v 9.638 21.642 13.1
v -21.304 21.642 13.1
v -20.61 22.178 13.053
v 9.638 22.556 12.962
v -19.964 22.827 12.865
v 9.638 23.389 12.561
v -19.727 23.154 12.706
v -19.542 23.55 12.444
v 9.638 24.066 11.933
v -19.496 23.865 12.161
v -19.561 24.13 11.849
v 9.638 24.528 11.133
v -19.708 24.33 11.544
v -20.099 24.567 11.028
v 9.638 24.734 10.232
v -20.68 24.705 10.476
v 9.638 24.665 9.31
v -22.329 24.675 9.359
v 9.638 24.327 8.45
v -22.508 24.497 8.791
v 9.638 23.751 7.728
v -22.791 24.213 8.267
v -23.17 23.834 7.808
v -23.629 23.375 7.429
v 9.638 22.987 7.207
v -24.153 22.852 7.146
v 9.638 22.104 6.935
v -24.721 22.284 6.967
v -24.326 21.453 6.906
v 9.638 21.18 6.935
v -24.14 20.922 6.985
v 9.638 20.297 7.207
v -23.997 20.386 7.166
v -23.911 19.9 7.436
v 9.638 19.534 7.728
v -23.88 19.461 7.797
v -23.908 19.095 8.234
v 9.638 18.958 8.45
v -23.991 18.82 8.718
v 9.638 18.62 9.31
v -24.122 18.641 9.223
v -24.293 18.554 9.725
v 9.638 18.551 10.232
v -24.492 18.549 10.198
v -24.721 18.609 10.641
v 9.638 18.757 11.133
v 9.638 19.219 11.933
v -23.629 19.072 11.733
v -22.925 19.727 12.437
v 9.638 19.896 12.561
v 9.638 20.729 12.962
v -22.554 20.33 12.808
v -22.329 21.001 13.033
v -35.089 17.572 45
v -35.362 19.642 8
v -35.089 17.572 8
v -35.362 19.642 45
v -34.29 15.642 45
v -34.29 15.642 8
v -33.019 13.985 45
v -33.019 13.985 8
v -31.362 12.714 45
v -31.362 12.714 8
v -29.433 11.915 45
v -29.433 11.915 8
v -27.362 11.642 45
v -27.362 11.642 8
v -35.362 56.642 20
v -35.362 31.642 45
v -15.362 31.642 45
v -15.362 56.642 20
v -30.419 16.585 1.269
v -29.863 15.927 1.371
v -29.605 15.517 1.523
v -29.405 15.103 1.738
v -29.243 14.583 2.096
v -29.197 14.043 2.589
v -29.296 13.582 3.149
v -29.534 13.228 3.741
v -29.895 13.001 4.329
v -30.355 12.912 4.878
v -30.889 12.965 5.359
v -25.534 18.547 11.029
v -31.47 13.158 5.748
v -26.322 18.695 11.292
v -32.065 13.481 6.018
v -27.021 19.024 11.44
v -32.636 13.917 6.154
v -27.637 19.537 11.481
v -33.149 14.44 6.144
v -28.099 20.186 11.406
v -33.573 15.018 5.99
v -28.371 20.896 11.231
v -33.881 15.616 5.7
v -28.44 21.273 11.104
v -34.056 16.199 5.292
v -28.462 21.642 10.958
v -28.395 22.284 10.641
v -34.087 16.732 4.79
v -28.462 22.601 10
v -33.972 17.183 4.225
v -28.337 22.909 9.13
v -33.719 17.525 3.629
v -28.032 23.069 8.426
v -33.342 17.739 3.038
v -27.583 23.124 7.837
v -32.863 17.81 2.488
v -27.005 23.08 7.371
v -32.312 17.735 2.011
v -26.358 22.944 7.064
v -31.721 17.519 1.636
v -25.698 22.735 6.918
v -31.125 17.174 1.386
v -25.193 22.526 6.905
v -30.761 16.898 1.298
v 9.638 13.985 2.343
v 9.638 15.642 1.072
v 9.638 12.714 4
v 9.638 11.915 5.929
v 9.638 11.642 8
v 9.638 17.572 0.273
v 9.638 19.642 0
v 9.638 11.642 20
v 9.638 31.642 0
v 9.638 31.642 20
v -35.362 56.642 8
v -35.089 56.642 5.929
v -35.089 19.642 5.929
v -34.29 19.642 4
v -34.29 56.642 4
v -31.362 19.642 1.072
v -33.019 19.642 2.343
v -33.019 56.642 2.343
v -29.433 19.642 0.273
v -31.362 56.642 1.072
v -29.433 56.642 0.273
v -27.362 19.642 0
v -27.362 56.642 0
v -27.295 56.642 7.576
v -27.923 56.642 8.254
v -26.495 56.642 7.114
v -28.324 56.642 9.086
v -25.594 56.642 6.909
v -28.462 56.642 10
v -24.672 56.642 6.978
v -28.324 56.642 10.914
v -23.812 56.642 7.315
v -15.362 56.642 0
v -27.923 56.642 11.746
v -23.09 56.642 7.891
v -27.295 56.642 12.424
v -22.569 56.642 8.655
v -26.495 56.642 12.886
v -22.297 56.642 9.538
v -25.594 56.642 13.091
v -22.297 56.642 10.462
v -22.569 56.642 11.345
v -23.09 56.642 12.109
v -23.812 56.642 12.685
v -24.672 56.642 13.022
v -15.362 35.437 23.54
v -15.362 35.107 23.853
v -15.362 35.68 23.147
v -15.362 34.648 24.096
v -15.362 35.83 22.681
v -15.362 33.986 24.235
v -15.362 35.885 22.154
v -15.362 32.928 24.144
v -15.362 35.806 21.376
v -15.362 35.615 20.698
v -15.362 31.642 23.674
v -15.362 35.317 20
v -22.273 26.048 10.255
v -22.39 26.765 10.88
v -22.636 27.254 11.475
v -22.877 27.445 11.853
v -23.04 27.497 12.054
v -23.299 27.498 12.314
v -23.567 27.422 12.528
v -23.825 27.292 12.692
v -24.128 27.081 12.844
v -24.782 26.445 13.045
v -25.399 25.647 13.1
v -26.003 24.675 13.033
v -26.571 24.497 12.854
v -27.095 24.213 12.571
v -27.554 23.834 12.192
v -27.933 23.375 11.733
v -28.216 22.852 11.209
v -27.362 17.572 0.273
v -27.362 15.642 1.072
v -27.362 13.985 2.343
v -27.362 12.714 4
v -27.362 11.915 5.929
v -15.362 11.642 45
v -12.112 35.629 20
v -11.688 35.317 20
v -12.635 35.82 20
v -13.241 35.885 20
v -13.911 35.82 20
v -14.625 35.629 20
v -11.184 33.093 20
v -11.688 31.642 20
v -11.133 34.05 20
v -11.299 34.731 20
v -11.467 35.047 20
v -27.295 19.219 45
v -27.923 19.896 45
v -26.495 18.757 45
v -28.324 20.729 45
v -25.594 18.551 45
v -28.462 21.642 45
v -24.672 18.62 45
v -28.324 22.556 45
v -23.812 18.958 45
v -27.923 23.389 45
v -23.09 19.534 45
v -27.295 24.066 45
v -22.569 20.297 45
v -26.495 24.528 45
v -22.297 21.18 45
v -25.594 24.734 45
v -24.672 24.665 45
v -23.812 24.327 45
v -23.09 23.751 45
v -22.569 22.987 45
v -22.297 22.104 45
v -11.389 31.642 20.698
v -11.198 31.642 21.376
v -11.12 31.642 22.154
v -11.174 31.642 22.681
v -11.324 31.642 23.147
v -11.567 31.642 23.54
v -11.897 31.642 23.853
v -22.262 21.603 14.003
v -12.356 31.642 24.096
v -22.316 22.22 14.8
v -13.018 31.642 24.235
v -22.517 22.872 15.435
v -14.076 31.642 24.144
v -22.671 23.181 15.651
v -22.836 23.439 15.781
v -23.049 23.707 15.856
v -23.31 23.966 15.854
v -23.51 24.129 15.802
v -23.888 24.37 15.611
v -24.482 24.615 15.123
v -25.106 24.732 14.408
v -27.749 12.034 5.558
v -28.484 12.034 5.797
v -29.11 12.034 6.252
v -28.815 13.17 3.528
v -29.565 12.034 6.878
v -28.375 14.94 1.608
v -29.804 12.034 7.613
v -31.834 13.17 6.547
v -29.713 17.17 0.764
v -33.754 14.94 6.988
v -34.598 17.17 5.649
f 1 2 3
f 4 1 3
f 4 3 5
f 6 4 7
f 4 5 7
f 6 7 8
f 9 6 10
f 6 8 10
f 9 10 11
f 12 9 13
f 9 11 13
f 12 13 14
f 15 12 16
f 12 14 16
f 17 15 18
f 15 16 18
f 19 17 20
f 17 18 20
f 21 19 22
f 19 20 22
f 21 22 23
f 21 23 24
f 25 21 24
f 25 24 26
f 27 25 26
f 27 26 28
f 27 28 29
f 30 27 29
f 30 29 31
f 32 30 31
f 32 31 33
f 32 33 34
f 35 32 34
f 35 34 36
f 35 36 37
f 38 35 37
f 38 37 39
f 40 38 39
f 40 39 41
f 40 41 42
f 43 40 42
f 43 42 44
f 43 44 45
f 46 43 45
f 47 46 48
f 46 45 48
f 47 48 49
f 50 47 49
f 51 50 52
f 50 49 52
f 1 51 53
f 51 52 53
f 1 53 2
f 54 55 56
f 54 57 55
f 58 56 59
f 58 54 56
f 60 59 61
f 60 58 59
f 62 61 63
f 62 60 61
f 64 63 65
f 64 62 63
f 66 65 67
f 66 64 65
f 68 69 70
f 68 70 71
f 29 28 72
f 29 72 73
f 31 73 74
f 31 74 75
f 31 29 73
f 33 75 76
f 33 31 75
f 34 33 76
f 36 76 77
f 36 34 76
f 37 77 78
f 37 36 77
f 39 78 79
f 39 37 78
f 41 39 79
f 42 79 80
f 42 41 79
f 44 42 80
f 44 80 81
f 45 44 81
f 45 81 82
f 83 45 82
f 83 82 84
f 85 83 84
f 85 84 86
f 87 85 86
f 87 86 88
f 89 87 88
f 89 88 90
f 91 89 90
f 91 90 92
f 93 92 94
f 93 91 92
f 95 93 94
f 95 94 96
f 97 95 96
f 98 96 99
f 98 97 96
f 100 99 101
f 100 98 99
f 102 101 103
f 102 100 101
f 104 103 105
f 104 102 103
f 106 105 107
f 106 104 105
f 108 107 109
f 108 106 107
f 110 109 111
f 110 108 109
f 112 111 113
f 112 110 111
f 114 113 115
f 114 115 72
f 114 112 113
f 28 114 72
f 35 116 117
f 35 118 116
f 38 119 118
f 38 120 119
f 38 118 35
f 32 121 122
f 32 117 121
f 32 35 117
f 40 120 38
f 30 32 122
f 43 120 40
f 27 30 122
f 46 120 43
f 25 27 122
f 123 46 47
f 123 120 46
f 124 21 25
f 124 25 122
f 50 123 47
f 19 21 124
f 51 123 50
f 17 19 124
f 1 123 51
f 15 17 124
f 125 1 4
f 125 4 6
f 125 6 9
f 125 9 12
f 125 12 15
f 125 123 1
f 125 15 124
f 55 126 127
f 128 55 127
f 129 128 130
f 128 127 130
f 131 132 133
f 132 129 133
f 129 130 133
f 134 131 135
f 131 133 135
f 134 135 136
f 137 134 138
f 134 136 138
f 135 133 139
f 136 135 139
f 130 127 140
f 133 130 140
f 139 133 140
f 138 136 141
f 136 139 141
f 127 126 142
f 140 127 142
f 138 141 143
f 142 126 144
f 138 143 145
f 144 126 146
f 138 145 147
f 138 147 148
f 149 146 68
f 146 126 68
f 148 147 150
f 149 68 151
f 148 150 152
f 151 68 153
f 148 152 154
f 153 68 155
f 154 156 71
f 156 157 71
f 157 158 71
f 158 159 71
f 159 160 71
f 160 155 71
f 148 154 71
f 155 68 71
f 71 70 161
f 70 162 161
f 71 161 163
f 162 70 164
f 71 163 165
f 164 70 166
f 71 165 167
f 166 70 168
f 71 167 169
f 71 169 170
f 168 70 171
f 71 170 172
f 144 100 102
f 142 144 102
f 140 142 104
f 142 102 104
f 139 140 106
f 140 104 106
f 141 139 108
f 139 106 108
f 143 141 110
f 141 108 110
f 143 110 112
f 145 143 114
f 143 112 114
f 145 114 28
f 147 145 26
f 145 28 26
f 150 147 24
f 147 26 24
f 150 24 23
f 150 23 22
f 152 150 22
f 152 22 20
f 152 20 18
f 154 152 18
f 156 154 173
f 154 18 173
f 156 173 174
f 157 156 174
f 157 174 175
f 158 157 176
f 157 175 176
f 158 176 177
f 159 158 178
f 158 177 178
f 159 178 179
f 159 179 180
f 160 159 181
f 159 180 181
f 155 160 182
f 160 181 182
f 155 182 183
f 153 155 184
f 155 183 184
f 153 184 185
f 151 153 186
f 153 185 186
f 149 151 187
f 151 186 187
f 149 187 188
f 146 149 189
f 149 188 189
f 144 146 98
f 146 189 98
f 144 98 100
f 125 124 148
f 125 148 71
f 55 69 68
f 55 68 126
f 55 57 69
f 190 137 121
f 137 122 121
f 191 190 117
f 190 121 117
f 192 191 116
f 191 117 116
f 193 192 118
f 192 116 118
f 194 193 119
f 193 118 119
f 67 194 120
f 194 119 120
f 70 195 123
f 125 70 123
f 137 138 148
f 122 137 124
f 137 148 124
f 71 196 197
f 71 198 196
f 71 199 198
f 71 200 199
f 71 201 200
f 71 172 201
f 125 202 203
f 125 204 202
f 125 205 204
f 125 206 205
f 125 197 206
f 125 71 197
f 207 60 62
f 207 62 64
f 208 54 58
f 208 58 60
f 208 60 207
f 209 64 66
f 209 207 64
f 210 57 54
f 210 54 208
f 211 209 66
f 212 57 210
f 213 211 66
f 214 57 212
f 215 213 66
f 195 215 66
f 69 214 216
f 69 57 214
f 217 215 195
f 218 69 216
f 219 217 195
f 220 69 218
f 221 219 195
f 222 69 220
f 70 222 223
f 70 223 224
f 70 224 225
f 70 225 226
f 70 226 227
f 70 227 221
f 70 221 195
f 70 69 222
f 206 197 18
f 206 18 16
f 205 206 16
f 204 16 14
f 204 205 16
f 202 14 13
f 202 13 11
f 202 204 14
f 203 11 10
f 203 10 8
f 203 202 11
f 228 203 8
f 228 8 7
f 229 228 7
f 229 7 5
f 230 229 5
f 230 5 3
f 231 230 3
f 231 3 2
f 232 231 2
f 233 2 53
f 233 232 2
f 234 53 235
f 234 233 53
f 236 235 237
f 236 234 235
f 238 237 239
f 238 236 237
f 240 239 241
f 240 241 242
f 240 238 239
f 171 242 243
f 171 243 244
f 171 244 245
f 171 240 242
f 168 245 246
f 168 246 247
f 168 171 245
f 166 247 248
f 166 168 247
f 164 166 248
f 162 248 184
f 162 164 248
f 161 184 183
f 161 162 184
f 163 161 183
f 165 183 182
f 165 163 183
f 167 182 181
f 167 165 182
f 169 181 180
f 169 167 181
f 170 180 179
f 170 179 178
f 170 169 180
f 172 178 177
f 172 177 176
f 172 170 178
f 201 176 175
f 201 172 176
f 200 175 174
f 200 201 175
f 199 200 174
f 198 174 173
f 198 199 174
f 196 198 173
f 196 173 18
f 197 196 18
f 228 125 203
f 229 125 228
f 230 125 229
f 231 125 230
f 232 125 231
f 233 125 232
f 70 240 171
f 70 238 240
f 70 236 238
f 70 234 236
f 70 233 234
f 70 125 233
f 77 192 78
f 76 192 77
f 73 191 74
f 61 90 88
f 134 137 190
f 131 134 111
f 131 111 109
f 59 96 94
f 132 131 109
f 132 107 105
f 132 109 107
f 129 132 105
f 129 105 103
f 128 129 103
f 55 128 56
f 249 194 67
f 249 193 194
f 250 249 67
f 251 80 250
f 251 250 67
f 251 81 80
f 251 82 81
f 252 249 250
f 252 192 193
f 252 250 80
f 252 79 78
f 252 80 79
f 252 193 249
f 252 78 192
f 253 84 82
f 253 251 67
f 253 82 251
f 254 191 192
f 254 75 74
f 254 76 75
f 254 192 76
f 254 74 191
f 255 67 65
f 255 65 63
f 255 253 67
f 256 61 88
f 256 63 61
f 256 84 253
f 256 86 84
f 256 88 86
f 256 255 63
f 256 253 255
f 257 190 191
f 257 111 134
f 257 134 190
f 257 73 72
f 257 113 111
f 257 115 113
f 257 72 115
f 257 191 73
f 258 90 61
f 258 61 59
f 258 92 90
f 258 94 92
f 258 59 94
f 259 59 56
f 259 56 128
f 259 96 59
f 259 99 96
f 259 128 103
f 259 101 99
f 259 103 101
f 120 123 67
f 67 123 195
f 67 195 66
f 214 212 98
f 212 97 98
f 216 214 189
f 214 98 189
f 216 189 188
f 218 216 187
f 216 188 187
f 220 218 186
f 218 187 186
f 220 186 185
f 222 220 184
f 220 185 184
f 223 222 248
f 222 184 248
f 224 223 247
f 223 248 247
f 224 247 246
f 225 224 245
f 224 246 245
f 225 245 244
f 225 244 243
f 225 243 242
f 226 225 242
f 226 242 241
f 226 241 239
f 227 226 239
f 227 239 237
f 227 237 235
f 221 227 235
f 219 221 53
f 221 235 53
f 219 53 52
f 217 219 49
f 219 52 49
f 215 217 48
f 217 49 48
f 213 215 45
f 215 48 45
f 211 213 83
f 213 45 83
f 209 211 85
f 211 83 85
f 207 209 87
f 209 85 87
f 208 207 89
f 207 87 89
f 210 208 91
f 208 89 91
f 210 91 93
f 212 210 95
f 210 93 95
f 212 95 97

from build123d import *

# Parameters (mm, degrees)
ESBO_O1_W                        = 45
ESBO_O1_H                        = 45
RESSALTO_EXTRUS_O1_DEPTH         = 20
ESBO_O2_W                        = 25
ESBO_O2_H                        = 25
CORTE_EXTRUS_O1_DEPTH            = 70.705238631
ESBO_O3_W                        = 20
ESBO_O3_H                        = 20
RESSALTO_EXTRUS_O2_DEPTH         = 25
FURO_DE_DI_METRO_6_2_6_2_1_D     = 6.2
FURO_DE_DI_METRO_6_2_6_2_1_DEPTH = 35
FURO_DE_DI_METRO_6_2_6_2_2_D     = 6.2
FURO_DE_DI_METRO_6_2_6_2_2_DEPTH = 35
FURO_DE_DI_METRO_6_2_6_2_3_D     = 6.2
FURO_DE_DI_METRO_6_2_6_2_3_DEPTH = 35
FILETE2_R                        = 8
CHANFRO1_SIZE                    = 25
CHANFRO2_SIZE                    = 25
RESSALTO_EXTRUS_O3_DEPTH         = 20
ESBO_O12_R                       = 3
CORTE_EXTRUS_O2_DEPTH            = 71.906960985


# Some blends are built 0.0001 mm under size
with BuildPart() as part:
    # Esboço1 → Ressalto-extrusão1 (new body)
    with BuildSketch(Plane.XY.offset(20)):
        with Locations((-12.862035225, 34.142270059)):
            Rectangle(ESBO_O1_W, ESBO_O1_H)
    extrude(amount=-RESSALTO_EXTRUS_O1_DEPTH)

    # Esboço2 → Corte-extrusão1 (cut, through all)
    with BuildSketch(Plane(origin=(0, 0, 0), x_dir=(-1, 0, 0), z_dir=(0, 0, -1))):
        with Locations((2.862035225, 44.142270059)):
            Rectangle(ESBO_O2_W, ESBO_O2_H)
    extrude(amount=-CORTE_EXTRUS_O1_DEPTH, mode=Mode.SUBTRACT)

    # Esboço3 → Ressalto-extrusão2 (add)
    with BuildSketch(Plane.XY.offset(20)):
        with Locations((-25.362035225, 21.642270059)):
            Rectangle(ESBO_O3_W, ESBO_O3_H)
    extrude(amount=RESSALTO_EXTRUS_O2_DEPTH)

    # Furo de diâmetro Ø6.2 (6.2)1
    with Locations(Plane(origin=(9.637964775, 0, 0), x_dir=(0, 0, -1), z_dir=(1, 0, 0))):
        with Locations((-10, 21.642270059)):
            Hole(FURO_DE_DI_METRO_6_2_6_2_1_D / 2, depth=FURO_DE_DI_METRO_6_2_6_2_1_DEPTH)

    # Furo de diâmetro Ø6.2 (6.2)2
    with Locations(Plane(origin=(0, 56.642270059, 0), x_dir=(1, 0, 0), z_dir=(0, 1, 0))):
        with Locations((-25.362035225, -10)):
            Hole(FURO_DE_DI_METRO_6_2_6_2_2_D / 2, depth=FURO_DE_DI_METRO_6_2_6_2_2_DEPTH)

    # Furo de diâmetro Ø6.2 (6.2)3
    with Locations(Plane.XY.offset(45)):
        with Locations((-25.362035225, 21.642270059)):
            Hole(FURO_DE_DI_METRO_6_2_6_2_3_D / 2, depth=FURO_DE_DI_METRO_6_2_6_2_3_DEPTH)

    # Filete2
    filete2_edges = [part.edges().sort_by_distance(p)[0] for p in [
        (-35.362035225, 34.142270059, 0),
        (-12.862035225, 11.642270059, 0),
        (-35.362035225, 11.642270059, 22.5),
    ]]
    fillet(filete2_edges, radius=FILETE2_R)

    # Chanfro1
    # the kernel refuses this chamfer: 25 mm, written as the material it adds along each edge
    with BuildSketch(Plane(origin=(-35.362035225, 31.642270059, 20), x_dir=(0, -0.027495876610586317, 0.9996219169112966), z_dir=(1, 0, 0))) as chanfro1_piece_1_section:
        Polygon((CHANFRO1_SIZE * 0.999621916911, -CHANFRO1_SIZE * 0.0274958766106), (-CHANFRO1_SIZE * 0.0274958766106, -CHANFRO1_SIZE * 0.999621916911), (0, 0), align=None)
    chanfro1_piece_1 = extrude(amount=20, mode=Mode.PRIVATE)
    chanfro1_piece_1 = split(chanfro1_piece_1, bisect_by=Plane(origin=(-25.362035225, 39.873368248, 45), z_dir=(0, 0, -1)), keep=Keep.TOP, mode=Mode.PRIVATE)
    chanfro1_piece_1 = split(chanfro1_piece_1, bisect_by=Plane(origin=(-25.362035225, 56.642270059, 28.231098189), z_dir=(0, -1, 0)), keep=Keep.TOP, mode=Mode.PRIVATE)
    add(chanfro1_piece_1)

    # Chanfro2
    chanfro2_edges = [part.edges().sort_by_distance(p)[0] for p in [
        (-15.362035225, 31.642270059, 10),
    ]]
    chamfer(chanfro2_edges, length=CHANFRO2_SIZE - 0.0001)  # a hair under: the kernel refuses the full size

    # Esboço10 → Ressalto-extrusão3 (add)
    with BuildSketch(Plane.XZ.offset(-11.642270059)):
        Polygon((-15.362035225, 45), (9.637964775, 20), (-15.362035225, 20), align=None)
    extrude(amount=-RESSALTO_EXTRUS_O3_DEPTH)

    # Esboço12 → Corte-extrusão2 (cut, through all)
    with BuildSketch(Plane(origin=(20.426744945, 20.426744945, 20.426744945), x_dir=(-0.8164965809277259, 0.408248290463863, 0.4082482904638632), z_dir=(-0.577350269189626, -0.5773502691896256, -0.5773502691896258))):
        with Locations(Location((33.625917704, 8.232328107, 0), (0, 0, 120.000005232))):
            Circle(ESBO_O12_R)
    extrude(amount=CORTE_EXTRUS_O2_DEPTH, mode=Mode.SUBTRACT)


solid = part.part
